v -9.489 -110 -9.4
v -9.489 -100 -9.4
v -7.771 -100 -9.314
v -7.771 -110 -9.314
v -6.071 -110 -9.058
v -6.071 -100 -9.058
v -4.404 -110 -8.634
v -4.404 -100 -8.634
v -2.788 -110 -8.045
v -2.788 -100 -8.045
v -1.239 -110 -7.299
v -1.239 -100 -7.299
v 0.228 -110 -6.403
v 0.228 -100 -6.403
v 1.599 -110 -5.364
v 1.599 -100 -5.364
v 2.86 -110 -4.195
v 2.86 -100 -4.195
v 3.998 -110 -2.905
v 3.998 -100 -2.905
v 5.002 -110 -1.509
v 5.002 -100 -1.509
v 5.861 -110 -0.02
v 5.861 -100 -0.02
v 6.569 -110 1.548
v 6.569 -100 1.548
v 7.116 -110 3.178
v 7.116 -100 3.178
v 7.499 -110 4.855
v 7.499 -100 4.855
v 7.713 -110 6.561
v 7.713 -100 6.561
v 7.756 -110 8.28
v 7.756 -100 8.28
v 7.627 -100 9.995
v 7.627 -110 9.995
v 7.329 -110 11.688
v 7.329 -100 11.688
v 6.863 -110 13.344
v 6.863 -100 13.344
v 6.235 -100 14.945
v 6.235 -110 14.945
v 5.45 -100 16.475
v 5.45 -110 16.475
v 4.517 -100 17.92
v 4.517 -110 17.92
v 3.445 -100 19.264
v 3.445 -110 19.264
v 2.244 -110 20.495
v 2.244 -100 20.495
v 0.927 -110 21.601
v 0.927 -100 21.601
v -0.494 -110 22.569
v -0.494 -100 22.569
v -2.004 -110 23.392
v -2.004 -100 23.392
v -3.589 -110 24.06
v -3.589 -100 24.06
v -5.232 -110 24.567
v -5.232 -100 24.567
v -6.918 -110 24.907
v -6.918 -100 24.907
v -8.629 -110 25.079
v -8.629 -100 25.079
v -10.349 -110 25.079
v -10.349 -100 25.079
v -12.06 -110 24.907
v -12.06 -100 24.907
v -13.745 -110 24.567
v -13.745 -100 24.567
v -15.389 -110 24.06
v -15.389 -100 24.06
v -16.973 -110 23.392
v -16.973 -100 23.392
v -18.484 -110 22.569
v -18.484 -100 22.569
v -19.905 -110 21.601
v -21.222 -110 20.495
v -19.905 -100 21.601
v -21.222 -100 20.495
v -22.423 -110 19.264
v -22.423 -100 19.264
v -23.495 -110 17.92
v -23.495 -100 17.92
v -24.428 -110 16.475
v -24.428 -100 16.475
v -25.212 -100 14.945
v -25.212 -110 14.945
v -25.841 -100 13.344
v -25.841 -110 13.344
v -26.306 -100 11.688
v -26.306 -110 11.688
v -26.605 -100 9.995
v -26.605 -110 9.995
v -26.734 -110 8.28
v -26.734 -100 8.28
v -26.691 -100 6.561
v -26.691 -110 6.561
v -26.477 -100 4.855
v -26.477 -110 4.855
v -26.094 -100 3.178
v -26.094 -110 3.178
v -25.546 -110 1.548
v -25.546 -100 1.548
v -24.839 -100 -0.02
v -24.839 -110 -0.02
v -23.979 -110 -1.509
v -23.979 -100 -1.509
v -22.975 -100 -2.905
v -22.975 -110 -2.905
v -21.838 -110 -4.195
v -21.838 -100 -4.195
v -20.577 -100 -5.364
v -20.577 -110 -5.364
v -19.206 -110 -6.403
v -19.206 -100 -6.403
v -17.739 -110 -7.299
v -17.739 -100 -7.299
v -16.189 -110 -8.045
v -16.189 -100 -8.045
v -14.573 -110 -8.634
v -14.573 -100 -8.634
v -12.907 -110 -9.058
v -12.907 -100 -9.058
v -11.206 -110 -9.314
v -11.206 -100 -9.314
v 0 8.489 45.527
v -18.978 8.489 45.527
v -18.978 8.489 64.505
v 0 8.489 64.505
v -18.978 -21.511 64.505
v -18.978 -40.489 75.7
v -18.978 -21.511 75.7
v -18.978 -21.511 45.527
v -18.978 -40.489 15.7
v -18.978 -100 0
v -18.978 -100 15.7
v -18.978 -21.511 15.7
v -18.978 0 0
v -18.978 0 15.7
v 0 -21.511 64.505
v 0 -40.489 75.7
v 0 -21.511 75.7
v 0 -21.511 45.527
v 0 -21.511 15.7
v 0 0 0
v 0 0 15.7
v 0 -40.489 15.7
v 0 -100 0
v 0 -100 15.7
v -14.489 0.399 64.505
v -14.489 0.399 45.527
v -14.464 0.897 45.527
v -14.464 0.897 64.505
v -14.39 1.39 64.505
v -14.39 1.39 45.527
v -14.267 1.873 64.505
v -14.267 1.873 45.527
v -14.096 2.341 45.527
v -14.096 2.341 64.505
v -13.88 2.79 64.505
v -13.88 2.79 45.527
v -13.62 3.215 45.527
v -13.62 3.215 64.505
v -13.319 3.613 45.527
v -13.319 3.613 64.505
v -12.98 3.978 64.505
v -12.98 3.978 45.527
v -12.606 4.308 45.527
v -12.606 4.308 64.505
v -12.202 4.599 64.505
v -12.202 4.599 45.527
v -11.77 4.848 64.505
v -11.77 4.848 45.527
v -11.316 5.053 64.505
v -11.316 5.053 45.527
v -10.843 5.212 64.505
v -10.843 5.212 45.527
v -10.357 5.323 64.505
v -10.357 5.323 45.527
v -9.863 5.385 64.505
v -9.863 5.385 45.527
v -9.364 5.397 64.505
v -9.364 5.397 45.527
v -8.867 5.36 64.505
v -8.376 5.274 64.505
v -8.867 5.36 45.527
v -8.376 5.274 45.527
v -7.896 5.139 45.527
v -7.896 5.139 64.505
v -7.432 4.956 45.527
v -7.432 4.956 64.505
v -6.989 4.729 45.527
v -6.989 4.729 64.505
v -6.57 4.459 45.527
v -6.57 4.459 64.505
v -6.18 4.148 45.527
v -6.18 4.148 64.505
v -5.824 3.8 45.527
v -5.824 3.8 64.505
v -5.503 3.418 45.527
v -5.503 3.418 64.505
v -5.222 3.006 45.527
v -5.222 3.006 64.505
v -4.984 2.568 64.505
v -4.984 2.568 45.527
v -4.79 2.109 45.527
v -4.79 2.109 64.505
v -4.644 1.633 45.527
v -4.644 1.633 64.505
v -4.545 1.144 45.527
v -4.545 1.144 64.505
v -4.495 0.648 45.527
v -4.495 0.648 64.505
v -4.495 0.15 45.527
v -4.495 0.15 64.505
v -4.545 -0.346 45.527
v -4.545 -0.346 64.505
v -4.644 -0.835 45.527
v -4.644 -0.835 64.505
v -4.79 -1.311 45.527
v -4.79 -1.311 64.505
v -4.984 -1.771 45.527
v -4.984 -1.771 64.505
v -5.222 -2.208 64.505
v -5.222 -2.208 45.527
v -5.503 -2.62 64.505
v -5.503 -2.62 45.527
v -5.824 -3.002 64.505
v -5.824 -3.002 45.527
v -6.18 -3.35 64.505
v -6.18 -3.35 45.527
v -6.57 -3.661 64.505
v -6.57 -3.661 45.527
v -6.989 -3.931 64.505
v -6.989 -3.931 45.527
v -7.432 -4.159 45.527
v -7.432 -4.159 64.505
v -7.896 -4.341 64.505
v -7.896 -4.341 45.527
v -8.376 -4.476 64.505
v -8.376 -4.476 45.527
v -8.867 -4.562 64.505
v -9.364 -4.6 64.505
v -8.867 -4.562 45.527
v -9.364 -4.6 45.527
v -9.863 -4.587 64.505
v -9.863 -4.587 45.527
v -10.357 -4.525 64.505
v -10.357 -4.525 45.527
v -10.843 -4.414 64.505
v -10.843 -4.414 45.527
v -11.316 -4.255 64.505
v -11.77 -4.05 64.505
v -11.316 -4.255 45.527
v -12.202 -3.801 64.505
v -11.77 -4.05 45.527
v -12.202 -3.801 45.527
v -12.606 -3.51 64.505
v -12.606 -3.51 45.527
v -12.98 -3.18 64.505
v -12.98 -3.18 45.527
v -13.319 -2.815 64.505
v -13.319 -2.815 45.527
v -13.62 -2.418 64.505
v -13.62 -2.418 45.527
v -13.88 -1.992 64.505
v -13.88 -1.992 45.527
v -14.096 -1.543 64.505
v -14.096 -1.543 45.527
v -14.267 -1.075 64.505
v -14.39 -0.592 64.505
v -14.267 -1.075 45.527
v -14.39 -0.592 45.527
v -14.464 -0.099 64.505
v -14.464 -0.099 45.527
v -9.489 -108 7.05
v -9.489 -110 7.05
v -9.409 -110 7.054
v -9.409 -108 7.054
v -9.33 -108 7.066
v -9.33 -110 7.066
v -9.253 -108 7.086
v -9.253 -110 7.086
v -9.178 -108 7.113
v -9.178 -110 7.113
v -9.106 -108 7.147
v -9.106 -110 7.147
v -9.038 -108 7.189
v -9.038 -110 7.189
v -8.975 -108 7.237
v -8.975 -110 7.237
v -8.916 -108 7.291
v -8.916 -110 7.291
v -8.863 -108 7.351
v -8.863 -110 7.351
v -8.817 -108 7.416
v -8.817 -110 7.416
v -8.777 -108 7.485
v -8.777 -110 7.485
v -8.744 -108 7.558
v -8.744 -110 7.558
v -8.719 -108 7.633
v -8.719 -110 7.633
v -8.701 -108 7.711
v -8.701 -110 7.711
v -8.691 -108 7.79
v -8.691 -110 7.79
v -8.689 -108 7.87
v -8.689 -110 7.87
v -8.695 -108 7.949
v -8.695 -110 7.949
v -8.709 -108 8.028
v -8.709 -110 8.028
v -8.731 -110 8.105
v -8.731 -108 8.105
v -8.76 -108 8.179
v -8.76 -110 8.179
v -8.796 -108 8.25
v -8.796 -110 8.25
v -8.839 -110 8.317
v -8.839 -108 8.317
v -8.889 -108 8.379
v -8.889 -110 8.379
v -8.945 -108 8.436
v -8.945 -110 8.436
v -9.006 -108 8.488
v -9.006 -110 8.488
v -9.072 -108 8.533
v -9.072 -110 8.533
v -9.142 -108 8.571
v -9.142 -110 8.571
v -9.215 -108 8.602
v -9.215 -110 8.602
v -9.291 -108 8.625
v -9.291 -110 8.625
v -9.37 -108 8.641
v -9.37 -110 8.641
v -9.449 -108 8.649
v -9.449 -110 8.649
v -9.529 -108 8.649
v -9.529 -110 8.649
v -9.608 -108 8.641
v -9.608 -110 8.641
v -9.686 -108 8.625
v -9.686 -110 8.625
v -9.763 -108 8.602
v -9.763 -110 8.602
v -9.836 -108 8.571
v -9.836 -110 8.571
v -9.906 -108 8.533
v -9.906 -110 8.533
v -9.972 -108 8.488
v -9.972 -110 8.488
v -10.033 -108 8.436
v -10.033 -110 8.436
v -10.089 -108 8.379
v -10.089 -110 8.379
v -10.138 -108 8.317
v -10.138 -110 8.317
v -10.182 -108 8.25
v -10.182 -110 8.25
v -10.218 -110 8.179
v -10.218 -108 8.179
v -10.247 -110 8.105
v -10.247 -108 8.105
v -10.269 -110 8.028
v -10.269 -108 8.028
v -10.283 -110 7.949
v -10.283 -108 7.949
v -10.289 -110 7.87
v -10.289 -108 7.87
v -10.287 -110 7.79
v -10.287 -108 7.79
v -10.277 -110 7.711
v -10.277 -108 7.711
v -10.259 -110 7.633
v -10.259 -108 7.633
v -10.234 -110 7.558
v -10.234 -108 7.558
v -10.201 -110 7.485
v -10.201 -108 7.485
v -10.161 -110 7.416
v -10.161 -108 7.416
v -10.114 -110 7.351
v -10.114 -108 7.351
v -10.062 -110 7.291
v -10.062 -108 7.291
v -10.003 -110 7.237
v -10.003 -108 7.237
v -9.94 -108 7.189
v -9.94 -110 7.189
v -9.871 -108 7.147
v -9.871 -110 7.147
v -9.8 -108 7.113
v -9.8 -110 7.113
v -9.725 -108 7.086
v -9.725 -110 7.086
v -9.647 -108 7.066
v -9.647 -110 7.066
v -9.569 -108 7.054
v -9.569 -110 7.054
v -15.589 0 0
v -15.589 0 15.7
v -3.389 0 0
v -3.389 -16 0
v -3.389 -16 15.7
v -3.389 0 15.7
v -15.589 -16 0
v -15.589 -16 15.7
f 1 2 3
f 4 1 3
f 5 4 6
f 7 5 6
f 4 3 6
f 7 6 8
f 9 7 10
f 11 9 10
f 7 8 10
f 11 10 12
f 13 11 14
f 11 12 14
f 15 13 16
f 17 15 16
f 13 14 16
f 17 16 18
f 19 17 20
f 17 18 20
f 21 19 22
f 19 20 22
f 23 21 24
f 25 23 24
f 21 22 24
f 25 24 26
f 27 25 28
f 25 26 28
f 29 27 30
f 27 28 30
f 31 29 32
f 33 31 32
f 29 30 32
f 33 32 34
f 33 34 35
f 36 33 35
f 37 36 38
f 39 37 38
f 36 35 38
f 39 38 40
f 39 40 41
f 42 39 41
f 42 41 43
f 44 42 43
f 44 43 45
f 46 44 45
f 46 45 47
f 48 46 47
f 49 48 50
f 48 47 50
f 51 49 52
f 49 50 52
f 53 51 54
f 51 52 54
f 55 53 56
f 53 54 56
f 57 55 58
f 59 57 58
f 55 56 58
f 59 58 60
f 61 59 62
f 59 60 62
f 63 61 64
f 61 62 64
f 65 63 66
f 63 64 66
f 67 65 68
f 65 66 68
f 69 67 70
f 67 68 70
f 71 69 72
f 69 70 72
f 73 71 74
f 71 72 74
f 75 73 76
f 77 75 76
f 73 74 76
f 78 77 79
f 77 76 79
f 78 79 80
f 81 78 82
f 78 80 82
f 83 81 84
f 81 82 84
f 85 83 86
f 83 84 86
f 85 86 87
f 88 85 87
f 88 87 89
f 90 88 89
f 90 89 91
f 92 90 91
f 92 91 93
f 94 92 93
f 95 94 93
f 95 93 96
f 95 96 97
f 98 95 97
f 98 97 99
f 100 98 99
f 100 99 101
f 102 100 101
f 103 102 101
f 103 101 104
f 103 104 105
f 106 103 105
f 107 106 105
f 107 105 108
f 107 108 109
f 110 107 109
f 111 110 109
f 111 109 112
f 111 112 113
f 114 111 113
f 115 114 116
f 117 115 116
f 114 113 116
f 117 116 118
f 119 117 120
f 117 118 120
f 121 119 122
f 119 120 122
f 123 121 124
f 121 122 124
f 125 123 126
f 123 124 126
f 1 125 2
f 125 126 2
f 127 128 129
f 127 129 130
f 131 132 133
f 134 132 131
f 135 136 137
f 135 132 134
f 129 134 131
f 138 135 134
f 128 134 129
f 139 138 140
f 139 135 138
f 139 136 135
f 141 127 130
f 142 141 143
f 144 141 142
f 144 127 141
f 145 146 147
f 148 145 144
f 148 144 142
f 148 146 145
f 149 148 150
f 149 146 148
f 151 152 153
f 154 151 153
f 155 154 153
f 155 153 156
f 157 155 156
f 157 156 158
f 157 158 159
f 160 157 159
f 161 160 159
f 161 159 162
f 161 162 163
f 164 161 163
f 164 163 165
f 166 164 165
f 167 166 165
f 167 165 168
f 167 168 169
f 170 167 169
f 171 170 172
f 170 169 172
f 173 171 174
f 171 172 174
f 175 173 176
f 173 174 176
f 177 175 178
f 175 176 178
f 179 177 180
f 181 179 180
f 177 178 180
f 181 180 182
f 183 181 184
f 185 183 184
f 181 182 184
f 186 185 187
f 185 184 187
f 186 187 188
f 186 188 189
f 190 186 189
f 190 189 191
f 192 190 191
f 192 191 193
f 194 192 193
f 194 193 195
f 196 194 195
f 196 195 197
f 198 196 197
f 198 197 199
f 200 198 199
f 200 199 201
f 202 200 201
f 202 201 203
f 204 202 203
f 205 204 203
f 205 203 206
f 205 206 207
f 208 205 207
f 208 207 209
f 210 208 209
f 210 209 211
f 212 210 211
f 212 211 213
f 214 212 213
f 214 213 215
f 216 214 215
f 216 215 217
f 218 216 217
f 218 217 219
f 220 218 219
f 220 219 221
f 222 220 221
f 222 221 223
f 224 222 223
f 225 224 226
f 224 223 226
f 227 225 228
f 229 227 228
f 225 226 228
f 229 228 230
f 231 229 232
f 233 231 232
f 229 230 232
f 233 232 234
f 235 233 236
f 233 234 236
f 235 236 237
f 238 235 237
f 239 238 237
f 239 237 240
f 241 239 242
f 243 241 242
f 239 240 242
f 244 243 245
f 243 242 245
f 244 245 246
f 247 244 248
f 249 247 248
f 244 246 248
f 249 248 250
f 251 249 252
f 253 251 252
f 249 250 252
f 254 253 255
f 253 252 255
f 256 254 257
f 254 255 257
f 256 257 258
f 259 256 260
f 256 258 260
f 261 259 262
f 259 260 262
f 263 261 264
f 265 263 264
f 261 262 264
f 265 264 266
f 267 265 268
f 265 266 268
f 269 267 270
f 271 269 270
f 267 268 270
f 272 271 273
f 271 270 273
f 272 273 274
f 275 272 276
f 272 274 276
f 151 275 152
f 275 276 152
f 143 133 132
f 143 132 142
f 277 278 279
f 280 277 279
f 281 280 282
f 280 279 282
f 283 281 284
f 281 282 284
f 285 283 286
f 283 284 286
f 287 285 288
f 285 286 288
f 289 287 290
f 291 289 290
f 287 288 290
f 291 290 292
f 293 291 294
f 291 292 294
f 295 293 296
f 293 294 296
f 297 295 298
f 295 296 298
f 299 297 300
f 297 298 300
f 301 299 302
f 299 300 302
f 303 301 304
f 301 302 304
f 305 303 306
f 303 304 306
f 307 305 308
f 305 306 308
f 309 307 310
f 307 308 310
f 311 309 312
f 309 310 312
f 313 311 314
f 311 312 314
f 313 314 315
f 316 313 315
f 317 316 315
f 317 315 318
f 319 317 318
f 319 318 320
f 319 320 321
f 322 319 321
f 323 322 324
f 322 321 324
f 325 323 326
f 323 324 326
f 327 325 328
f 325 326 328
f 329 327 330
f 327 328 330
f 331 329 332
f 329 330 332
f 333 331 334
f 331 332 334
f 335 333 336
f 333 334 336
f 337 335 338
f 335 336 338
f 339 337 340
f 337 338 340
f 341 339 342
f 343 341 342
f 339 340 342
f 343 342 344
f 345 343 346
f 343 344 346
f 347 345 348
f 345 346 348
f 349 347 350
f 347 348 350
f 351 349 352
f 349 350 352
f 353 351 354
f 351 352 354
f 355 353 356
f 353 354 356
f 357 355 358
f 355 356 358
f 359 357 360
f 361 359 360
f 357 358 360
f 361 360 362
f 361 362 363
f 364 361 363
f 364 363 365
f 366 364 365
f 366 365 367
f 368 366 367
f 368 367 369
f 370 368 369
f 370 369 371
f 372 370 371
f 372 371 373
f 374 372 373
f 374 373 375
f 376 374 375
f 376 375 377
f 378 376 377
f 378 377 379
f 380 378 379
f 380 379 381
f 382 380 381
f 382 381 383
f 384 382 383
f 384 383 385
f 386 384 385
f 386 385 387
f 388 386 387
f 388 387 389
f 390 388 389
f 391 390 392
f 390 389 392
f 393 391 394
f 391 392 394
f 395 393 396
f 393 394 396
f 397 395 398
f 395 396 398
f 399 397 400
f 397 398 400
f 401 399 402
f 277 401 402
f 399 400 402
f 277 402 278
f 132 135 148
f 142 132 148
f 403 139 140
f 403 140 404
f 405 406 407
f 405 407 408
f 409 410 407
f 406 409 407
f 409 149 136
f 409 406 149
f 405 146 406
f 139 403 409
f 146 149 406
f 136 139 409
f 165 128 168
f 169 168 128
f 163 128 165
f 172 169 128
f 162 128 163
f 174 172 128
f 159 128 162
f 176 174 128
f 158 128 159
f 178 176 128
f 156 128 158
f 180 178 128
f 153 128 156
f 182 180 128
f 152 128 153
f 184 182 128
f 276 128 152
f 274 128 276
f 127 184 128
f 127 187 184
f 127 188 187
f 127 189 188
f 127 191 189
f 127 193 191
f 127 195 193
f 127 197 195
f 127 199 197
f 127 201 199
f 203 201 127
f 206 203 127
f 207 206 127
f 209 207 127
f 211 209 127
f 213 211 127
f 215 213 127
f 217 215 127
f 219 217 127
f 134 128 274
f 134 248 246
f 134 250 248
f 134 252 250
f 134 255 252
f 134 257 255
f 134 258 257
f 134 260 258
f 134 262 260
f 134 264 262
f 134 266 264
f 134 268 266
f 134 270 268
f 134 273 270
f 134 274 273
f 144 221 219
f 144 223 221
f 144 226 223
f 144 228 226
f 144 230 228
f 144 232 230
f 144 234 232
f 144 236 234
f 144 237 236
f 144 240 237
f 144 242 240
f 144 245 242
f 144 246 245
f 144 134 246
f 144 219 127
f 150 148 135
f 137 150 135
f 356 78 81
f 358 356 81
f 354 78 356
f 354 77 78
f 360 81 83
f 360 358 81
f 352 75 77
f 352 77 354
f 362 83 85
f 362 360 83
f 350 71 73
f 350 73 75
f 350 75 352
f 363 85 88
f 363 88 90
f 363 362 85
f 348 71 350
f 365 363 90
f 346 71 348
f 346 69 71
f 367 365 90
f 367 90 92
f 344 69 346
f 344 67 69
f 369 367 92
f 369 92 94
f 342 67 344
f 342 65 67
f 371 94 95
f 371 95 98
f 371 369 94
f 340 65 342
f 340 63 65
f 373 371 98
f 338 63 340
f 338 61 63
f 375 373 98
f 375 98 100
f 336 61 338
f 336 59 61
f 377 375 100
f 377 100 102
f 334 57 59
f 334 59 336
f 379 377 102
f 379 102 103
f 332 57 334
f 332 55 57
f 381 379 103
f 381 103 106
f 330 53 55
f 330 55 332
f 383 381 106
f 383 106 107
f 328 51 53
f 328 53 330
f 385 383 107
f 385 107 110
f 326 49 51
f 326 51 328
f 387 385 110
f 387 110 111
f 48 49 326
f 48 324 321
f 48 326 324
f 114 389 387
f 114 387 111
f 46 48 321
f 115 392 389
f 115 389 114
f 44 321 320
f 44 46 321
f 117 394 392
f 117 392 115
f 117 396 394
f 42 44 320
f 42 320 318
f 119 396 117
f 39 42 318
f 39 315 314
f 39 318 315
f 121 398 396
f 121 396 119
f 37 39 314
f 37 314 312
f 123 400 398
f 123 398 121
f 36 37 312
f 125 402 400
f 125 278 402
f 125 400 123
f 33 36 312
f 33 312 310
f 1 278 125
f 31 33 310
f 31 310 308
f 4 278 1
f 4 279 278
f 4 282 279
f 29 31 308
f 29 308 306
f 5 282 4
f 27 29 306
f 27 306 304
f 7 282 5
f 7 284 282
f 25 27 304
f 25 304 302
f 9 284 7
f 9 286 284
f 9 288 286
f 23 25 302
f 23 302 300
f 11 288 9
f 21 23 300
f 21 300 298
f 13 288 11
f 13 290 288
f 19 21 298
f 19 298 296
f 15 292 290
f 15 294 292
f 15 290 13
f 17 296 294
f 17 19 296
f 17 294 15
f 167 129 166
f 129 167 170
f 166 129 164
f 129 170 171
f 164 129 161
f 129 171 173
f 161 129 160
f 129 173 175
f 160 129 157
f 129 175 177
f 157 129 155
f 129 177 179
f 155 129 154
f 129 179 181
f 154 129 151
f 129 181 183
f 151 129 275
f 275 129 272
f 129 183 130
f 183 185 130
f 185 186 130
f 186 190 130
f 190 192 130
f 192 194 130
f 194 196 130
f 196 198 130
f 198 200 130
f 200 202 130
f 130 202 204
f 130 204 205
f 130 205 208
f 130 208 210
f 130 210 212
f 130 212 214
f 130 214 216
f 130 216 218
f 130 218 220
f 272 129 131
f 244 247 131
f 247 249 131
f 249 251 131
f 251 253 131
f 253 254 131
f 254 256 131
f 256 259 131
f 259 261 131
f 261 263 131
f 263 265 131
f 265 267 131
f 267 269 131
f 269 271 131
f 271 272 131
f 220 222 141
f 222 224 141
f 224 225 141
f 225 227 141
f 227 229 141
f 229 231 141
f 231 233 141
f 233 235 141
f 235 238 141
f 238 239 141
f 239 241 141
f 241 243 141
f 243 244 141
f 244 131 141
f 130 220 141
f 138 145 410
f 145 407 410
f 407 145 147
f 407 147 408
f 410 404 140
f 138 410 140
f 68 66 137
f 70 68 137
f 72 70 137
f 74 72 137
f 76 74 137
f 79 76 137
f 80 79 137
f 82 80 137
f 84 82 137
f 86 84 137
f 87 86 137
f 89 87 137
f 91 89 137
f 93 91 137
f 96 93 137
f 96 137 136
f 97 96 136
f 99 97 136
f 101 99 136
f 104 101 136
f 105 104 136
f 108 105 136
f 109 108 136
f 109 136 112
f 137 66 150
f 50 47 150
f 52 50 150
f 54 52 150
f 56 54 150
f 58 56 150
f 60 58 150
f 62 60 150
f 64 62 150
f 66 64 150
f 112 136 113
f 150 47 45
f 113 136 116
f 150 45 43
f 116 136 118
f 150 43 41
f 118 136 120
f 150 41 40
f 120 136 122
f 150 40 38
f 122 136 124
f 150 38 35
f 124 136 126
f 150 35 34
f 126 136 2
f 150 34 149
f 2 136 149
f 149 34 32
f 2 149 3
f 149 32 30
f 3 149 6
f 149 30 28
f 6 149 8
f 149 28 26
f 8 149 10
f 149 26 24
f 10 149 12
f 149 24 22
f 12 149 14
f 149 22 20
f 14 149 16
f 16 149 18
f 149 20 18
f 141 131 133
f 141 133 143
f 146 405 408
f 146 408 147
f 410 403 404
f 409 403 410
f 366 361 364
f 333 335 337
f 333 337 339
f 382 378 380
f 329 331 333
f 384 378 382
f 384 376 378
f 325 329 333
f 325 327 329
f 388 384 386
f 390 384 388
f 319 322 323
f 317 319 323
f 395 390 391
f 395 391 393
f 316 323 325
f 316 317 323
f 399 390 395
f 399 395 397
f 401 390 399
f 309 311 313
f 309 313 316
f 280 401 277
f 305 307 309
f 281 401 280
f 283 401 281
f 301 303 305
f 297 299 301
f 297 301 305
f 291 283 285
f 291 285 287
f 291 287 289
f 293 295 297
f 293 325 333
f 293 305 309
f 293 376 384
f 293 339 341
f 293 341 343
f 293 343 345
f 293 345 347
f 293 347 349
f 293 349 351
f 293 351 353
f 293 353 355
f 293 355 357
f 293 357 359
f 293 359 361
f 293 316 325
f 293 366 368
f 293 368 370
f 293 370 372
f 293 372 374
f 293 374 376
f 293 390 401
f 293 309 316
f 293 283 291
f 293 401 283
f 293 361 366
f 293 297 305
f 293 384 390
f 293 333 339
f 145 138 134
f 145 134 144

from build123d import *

# Parameters (mm, degrees)
BOSS_EXTRUDE1_DEPTH = 15.7
SKETCH2_R           = 17.25
BOSS_EXTRUDE2_DEPTH = 10
SKETCH4_R           = 0.8
CUT_EXTRUDE1_DEPTH  = 2
SKETCH5_W           = 18.977777778
SKETCH5_H           = 18.977777778
BOSS_EXTRUDE3_DEPTH = 60
SKETCH6_W           = 18.977777778
SKETCH6_H           = 18.977777778
BOSS_EXTRUDE4_DEPTH = 30
CUT_EXTRUDE3_REACH  = 127.825
SKETCH7_R           = 5


with BuildPart() as part:
    # Sketch1 → Boss-Extrude1 (new body)
    with BuildSketch(Plane.XY):
        Polygon((0, 0), (0, -100), (-18.977777778, -100), (-18.977777778, 0), (-15.588888889, 0), (-15.588888889, -16), (-3.388888889, -16), (-3.388888889, 0), align=None)
    extrude(amount=BOSS_EXTRUDE1_DEPTH)

    # Sketch2 → Boss-Extrude2 (add)
    with BuildSketch(Plane.XZ.offset(100)):
        with Locations(Location((-9.488888889, 7.85, 0), (0, 0, 270))):
            Circle(SKETCH2_R)
    extrude(amount=BOSS_EXTRUDE2_DEPTH)

    # Sketch4 → Cut-Extrude1 (cut)
    with BuildSketch(Plane.XZ.offset(110)):
        with Locations(Location((-9.488888889, 7.85, 0), (0, 0, 270))):
            Circle(SKETCH4_R)
    extrude(amount=-CUT_EXTRUDE1_DEPTH, mode=Mode.SUBTRACT)

    # Sketch5 → Boss-Extrude3 (add)
    with BuildSketch(Plane.XY.offset(15.7)):
        with Locations((-9.488888889, -31)):
            Rectangle(SKETCH5_W, SKETCH5_H)
    extrude(amount=BOSS_EXTRUDE3_DEPTH)

    # Sketch6 → Boss-Extrude4 (add)
    with BuildSketch(Plane(origin=(0, -21.511111111, 0), x_dir=(1, 0, 0), z_dir=(0, 1, 0))):
        with Locations((-9.488888889, -55.01587184)):
            Rectangle(SKETCH6_W, SKETCH6_H)
    extrude(amount=BOSS_EXTRUDE4_DEPTH)

    # Sketch7 → Cut-Extrude3 (cut, up to next)
    with BuildSketch(Plane(origin=(0, 0, 45.526982951), x_dir=(-1, 0, 0), z_dir=(0, 0, -1)), mode=Mode.PRIVATE) as cut_extrude3_sk1:
        with Locations((9.488888889, 0.398888889)):
            Circle(SKETCH7_R)
    cut_extrude3_tool1 = extrude(cut_extrude3_sk1.sketch, amount=-CUT_EXTRUDE3_REACH, mode=Mode.PRIVATE) & part.part
    add(cut_extrude3_tool1.solids().sort_by_distance((-9.488889, 0.398889, 45.526983))[0], mode=Mode.SUBTRACT)


solid = part.part
